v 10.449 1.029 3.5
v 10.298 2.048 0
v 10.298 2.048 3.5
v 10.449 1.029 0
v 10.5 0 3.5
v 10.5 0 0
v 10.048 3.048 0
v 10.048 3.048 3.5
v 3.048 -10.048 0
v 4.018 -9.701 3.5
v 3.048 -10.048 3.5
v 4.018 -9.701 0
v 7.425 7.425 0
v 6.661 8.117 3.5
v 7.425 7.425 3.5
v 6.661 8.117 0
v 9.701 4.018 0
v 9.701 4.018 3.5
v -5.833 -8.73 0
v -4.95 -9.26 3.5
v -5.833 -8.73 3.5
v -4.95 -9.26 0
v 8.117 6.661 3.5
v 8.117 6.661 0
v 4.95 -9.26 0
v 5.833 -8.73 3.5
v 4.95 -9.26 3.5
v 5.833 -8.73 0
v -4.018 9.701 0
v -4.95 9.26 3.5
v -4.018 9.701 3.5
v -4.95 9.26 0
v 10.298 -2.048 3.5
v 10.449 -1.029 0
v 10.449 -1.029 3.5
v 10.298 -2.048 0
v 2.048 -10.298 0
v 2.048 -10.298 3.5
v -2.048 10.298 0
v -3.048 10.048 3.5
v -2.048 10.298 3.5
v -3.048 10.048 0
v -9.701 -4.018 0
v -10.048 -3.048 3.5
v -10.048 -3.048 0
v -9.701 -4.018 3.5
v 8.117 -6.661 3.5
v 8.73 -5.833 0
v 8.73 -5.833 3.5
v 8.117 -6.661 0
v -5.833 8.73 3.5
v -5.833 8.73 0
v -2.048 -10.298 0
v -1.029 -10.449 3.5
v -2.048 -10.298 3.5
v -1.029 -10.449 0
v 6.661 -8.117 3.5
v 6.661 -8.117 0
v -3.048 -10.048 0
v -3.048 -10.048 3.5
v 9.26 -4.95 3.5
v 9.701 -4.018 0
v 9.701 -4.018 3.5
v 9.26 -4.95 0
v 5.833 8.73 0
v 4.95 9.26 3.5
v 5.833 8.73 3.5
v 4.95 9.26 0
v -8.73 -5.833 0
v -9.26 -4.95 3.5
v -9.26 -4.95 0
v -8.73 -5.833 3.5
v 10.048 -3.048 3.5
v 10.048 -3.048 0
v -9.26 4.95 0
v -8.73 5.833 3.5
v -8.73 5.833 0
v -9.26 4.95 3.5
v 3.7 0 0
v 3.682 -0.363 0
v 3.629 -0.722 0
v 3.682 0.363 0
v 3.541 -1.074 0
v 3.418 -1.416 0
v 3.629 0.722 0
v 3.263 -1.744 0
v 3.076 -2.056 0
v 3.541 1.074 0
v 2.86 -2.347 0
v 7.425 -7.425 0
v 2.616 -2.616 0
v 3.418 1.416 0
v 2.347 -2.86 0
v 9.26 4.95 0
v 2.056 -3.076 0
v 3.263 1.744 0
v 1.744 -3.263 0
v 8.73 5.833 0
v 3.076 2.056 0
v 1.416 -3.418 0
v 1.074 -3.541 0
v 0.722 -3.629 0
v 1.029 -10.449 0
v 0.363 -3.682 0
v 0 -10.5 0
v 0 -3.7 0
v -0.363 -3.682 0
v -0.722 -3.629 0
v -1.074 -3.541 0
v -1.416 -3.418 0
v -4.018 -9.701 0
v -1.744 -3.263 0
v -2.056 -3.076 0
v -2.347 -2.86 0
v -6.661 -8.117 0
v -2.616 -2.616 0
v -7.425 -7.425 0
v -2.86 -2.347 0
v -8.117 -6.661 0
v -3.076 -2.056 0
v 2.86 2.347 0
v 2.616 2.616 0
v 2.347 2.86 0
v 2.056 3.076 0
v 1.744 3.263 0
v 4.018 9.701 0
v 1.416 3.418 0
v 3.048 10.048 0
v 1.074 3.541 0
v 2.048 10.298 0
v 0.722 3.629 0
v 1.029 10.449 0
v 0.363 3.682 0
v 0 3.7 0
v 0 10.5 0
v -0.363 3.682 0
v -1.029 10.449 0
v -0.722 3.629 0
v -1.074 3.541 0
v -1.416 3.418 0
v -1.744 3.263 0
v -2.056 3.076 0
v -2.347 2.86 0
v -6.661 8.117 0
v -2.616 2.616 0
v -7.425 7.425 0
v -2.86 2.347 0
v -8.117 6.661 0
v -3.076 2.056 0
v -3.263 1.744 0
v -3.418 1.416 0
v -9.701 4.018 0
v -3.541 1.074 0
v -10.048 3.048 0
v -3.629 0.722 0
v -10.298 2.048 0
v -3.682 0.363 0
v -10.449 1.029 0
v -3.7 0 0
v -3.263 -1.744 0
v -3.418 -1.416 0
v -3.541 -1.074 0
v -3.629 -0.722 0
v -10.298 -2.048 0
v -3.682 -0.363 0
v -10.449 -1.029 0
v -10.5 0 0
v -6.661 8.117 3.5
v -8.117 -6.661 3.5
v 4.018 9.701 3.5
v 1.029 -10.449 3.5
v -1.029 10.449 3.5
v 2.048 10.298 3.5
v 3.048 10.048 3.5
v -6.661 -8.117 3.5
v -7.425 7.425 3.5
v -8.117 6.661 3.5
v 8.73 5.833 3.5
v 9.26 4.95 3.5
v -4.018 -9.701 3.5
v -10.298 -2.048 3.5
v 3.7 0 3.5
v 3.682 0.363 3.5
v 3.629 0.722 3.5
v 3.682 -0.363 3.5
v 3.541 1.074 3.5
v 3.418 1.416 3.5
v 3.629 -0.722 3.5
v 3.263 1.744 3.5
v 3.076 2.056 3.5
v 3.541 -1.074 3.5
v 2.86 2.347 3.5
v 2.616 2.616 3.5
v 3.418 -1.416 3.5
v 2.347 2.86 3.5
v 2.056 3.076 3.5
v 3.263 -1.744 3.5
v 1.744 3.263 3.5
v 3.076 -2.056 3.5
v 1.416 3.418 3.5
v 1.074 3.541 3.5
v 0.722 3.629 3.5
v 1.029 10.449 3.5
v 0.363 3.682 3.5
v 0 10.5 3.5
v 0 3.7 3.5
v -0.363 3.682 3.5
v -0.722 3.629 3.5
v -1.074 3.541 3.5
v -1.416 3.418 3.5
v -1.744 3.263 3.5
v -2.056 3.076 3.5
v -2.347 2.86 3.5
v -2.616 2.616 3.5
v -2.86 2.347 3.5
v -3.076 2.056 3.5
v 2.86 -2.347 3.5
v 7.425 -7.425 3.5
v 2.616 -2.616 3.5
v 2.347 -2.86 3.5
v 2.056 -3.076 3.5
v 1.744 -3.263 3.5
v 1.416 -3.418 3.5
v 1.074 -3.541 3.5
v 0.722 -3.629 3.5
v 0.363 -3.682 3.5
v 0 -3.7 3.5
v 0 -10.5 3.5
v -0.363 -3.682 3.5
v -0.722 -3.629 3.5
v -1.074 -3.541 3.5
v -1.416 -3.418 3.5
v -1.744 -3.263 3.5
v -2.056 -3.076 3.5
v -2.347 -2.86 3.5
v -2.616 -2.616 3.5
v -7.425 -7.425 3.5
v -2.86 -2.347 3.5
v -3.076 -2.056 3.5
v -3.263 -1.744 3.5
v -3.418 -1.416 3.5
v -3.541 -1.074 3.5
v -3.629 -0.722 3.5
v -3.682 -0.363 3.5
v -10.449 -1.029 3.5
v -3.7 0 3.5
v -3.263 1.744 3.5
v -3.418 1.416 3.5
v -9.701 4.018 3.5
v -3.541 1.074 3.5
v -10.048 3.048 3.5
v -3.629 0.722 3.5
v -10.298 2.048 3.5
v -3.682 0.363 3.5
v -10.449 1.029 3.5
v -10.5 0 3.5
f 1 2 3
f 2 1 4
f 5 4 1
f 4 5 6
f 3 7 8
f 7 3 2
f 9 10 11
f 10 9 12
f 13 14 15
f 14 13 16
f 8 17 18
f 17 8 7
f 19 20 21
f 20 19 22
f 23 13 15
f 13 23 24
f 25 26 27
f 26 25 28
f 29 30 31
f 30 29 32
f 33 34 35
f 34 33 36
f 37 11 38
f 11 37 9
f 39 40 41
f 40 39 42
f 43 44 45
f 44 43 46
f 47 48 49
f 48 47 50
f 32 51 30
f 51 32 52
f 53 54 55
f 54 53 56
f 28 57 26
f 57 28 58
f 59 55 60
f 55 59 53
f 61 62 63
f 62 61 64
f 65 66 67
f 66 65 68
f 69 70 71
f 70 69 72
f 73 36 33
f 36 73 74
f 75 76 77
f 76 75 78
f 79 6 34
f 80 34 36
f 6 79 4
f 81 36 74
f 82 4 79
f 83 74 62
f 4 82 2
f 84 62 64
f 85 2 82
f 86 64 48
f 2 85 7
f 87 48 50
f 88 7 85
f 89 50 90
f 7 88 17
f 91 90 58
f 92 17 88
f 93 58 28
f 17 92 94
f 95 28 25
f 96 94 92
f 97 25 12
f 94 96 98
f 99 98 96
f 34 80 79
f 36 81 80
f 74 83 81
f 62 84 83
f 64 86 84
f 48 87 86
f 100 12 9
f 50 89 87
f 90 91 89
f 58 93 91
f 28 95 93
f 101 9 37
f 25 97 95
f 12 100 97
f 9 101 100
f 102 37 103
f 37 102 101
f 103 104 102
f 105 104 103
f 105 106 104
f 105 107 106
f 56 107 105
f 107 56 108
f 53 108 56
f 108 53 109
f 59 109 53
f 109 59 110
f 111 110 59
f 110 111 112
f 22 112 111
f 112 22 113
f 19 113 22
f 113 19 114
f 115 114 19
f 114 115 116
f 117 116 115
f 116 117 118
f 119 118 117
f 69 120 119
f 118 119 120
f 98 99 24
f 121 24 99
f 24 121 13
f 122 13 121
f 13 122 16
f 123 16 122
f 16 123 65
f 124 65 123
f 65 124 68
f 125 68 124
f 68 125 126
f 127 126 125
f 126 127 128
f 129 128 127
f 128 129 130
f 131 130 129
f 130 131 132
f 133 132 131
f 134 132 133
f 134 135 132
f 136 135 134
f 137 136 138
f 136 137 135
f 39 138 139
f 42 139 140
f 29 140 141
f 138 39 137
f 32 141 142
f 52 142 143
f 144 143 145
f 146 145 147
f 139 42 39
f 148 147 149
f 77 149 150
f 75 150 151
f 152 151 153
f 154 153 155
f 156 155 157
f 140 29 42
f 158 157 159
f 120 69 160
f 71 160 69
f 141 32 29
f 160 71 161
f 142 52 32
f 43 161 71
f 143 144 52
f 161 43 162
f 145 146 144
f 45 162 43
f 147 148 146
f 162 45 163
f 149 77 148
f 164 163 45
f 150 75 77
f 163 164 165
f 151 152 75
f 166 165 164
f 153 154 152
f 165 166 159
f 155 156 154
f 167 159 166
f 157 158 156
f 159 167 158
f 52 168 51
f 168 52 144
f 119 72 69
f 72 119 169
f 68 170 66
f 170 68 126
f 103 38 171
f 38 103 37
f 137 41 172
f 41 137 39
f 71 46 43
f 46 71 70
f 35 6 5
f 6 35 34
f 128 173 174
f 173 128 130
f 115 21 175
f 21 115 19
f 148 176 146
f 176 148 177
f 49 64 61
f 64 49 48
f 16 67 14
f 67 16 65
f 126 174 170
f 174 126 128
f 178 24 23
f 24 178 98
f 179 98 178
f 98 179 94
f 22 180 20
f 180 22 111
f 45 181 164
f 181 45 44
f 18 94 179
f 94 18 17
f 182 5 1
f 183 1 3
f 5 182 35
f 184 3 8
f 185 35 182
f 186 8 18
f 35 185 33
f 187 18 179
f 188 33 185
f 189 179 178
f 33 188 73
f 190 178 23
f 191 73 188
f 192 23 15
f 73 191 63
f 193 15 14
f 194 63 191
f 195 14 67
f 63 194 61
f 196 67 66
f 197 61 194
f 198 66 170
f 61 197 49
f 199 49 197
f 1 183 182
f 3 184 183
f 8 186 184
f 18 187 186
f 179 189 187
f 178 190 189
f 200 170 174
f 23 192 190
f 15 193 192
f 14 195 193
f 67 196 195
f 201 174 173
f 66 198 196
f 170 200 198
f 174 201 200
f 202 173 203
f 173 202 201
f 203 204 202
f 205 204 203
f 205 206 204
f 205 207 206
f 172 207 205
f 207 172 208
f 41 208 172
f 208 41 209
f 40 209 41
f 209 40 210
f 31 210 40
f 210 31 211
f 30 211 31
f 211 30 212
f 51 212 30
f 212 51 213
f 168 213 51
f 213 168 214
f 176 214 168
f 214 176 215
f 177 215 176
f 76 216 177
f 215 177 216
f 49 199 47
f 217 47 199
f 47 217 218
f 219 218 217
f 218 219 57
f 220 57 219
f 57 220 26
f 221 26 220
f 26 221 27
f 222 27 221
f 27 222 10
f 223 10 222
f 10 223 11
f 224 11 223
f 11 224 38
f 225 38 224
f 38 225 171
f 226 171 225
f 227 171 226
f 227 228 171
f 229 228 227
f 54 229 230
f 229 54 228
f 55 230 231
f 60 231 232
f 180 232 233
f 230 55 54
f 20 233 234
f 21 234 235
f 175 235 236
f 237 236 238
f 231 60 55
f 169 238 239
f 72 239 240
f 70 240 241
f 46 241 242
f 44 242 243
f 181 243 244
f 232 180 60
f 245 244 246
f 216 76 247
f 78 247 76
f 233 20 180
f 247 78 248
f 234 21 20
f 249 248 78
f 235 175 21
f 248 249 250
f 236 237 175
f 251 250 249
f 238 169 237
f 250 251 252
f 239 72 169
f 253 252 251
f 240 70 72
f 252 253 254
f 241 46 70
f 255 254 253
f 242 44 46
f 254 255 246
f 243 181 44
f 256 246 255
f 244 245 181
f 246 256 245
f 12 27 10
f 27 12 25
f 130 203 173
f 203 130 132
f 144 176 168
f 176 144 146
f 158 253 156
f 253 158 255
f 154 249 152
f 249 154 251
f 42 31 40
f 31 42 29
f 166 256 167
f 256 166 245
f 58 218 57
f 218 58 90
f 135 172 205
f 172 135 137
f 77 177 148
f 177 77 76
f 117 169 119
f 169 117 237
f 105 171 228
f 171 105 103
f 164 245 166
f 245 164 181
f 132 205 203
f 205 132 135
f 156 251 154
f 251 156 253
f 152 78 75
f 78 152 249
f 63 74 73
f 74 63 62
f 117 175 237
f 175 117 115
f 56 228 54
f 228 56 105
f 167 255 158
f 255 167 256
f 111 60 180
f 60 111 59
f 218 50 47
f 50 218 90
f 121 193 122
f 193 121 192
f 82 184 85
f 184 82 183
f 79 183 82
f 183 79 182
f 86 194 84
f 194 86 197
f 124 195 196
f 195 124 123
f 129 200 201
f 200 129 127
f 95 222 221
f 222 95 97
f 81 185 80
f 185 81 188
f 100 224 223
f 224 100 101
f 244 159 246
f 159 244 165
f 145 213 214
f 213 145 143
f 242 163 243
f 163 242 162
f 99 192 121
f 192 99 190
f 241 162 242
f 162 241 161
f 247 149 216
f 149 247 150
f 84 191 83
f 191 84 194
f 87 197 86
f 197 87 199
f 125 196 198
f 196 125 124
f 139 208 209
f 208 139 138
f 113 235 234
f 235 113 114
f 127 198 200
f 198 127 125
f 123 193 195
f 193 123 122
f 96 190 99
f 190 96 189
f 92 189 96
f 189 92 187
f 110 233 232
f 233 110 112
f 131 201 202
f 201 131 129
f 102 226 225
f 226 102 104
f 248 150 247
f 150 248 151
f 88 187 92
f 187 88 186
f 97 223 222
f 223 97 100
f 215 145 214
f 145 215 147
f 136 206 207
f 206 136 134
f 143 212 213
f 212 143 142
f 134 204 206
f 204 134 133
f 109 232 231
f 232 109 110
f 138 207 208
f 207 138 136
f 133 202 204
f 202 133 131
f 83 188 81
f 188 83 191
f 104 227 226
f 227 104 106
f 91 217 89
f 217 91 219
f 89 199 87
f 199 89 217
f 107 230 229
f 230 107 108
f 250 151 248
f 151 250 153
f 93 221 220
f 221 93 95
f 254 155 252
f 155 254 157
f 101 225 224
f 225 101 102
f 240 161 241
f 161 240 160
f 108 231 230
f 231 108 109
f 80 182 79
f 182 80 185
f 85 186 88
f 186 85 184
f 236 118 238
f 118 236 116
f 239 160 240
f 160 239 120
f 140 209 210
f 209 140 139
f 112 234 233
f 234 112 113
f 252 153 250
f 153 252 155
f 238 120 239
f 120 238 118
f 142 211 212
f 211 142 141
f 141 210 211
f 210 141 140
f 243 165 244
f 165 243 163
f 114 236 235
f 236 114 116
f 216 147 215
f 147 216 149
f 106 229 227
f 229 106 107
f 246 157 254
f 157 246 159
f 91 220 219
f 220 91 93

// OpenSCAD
module radial() {
    difference() {
        cylinder(h=3.5, r=10.5, $fn=64);
        translate([0, 0, -0.1])
            cylinder(h=3.7, r=3.7, $fn=64);
    }
}

radial();
